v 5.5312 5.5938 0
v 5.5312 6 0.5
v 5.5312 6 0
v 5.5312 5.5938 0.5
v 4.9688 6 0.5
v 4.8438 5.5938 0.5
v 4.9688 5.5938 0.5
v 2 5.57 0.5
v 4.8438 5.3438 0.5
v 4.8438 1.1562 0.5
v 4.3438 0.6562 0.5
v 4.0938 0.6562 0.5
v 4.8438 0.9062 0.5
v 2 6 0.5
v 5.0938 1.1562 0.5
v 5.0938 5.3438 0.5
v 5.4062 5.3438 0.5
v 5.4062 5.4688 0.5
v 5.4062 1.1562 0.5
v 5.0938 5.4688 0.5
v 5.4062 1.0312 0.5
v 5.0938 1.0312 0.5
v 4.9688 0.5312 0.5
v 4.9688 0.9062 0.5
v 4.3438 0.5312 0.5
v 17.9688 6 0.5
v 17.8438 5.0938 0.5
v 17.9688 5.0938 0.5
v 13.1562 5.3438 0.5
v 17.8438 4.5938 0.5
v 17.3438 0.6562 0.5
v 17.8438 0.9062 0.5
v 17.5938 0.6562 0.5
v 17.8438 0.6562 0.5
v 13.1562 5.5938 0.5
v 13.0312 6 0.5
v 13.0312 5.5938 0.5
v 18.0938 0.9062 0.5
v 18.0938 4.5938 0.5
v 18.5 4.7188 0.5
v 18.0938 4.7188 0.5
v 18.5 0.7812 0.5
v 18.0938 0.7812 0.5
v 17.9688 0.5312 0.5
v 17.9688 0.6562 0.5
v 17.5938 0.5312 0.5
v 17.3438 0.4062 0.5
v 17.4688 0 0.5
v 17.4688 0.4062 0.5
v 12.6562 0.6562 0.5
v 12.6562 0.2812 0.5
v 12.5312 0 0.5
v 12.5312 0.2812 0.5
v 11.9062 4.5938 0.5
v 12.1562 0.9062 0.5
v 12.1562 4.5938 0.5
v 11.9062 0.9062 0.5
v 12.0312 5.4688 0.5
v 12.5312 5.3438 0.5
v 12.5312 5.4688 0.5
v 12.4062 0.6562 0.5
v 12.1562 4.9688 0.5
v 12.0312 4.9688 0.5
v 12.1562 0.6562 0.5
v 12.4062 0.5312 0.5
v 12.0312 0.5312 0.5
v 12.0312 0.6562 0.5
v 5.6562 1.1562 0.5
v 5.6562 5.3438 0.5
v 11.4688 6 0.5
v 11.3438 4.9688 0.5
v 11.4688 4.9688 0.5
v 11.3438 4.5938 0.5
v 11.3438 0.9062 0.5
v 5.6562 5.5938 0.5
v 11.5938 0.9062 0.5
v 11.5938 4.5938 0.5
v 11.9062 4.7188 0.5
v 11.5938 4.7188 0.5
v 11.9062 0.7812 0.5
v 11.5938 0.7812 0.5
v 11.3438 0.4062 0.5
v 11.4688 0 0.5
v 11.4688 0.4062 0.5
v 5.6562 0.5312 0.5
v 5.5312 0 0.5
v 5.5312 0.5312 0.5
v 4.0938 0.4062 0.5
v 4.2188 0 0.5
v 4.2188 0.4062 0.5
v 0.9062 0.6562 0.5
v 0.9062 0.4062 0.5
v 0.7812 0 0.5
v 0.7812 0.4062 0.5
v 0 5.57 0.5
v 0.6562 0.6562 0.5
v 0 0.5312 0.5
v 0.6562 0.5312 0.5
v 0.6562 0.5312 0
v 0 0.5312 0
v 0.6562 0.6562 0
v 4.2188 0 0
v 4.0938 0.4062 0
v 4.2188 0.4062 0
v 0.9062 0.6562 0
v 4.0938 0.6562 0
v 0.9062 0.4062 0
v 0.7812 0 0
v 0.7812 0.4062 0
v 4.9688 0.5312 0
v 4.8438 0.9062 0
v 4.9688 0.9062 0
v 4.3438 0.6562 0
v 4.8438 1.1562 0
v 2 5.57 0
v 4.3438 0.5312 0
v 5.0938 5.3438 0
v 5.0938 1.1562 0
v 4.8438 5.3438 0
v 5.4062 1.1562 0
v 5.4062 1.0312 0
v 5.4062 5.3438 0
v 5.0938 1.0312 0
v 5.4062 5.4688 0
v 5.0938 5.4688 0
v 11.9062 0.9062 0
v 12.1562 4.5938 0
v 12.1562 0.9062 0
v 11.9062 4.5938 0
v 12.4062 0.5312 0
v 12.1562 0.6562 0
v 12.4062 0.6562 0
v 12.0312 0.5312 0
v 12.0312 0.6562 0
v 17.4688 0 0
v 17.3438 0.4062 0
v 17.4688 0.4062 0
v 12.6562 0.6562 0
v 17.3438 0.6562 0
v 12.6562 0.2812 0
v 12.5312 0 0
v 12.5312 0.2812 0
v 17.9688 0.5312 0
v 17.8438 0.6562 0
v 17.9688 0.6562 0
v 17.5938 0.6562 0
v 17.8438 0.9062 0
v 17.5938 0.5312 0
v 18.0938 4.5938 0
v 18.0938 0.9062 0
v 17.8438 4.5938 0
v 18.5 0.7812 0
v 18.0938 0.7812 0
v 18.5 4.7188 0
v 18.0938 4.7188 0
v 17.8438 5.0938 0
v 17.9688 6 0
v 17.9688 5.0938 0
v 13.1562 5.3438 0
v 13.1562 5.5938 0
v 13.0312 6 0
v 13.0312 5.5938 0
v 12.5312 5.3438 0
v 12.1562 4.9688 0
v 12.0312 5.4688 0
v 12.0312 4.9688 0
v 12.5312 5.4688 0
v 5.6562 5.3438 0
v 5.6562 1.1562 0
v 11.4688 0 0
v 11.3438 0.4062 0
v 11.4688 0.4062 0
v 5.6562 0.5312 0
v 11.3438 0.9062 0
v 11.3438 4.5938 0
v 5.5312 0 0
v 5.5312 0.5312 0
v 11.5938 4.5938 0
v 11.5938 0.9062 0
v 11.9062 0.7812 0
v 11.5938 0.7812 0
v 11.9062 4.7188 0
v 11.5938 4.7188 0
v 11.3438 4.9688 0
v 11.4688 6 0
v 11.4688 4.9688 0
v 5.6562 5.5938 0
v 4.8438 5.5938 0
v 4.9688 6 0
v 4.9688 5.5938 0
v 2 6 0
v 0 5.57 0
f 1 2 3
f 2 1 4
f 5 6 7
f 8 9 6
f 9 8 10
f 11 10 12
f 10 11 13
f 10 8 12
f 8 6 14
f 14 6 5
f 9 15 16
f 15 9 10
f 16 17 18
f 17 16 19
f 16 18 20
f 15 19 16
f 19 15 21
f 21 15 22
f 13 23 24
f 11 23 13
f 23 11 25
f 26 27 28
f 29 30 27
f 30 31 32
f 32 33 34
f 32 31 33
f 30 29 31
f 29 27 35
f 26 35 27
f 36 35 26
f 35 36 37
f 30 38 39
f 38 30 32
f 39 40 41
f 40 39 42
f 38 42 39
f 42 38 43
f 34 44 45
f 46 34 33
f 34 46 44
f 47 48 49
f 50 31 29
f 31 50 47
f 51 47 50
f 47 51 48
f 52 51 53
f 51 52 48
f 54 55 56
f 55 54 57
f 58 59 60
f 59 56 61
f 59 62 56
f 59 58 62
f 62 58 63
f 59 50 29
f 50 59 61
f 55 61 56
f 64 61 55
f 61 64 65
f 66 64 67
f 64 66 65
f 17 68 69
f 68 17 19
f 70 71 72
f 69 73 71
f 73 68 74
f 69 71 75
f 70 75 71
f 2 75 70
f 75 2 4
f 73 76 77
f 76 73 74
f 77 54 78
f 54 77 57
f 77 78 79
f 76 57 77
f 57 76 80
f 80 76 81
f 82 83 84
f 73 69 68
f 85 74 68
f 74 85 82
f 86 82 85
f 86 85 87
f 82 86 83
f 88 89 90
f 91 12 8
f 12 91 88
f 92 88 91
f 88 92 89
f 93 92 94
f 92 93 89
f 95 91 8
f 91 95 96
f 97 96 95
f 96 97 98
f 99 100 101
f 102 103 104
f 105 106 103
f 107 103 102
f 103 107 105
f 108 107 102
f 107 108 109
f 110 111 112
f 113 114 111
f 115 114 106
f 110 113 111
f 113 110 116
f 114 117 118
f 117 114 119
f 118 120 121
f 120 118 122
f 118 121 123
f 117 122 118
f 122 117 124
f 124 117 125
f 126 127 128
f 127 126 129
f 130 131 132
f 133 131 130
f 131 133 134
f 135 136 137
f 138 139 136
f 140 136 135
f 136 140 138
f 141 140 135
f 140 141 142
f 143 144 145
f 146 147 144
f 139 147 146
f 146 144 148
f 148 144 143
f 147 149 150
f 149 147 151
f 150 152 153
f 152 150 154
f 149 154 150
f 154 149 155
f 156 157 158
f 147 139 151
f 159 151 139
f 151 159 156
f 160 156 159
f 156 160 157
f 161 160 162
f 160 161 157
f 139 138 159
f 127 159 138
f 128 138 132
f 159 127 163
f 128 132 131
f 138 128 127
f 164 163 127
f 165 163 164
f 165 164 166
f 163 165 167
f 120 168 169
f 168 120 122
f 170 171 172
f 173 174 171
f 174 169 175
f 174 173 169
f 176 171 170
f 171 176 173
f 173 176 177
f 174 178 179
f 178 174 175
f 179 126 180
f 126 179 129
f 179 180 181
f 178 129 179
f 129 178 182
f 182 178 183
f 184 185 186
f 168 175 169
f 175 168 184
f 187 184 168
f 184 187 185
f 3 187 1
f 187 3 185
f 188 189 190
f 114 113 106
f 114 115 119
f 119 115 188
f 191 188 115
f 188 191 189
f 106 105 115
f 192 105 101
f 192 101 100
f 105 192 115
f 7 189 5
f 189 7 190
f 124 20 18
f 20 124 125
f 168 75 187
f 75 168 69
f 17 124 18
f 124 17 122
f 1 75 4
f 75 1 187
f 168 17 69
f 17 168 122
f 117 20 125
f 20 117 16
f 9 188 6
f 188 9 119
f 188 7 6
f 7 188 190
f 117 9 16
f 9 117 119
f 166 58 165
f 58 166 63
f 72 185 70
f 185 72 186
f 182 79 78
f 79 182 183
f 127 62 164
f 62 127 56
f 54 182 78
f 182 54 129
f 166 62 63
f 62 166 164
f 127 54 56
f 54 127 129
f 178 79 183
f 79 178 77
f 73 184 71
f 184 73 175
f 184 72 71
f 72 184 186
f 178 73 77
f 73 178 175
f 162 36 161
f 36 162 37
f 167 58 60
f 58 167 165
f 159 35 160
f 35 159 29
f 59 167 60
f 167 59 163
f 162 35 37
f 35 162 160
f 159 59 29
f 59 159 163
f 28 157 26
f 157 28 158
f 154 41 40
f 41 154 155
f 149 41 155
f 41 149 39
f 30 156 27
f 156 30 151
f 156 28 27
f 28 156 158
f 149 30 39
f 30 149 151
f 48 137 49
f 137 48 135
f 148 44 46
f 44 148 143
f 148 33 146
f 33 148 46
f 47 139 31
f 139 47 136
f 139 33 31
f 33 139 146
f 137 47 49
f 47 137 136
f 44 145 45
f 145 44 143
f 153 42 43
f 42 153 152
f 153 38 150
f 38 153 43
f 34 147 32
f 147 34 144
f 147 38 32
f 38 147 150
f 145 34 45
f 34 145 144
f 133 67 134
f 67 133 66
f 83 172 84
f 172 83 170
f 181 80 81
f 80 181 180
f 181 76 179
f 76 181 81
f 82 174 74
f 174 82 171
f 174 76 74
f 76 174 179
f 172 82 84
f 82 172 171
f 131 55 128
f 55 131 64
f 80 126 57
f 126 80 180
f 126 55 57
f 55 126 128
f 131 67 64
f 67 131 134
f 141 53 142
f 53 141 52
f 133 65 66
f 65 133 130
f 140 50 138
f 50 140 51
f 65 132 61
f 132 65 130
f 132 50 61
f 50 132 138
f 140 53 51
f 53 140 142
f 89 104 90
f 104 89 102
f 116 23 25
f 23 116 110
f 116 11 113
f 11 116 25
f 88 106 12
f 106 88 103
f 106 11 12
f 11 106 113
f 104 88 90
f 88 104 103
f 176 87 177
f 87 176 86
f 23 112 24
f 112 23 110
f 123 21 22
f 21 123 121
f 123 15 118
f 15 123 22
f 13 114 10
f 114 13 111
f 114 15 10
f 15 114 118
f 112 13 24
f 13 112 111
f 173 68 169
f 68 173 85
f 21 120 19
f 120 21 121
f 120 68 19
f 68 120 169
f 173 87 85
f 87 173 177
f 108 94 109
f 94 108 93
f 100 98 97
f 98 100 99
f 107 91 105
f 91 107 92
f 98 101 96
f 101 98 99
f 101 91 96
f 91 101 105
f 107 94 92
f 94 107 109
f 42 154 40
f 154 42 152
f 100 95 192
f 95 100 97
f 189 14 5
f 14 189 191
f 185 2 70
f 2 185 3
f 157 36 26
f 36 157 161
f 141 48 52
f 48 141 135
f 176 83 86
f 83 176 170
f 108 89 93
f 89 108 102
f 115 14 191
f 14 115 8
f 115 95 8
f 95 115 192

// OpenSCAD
// file: modus.scad
//Corner Joint - allows the sides of two parts to create inlayed corner. Aids with welding.
//need to verify module math is the same throughout all parts.

module cornerjoint(Z,L,H,EndGap,PadL,PadH,CJangle,CJcenter){
    //change so that H = Z of inlayed part (usually 0.5)
    //add center and angle in degrees option, orgin far side of cut out area

     if((CJangle==0)&&(CJcenter==0))
      {    
        translate([0,0,0])
        rotate([0,0,CJangle])
        difference(){
        cube([L,H+PadH,Z]);
        translate([EndGap,H,0])
        cube([PadL,PadH,Z]);
        translate([L-EndGap-PadL,H,0])
        cube([PadL,PadH,Z]);}
      }    
else if((CJangle==90)&&(CJcenter==0))
      {    
        translate([H+PadH,0,0])
        rotate([0,0,CJangle])
        difference(){
        cube([L,H+PadH,Z]);
        translate([EndGap,H,0])
        cube([PadL,PadH,Z]);
        translate([L-EndGap-PadL,H,0])
        cube([PadL,PadH,Z]);}
      }
else if((CJangle==180)&&(CJcenter==0))       
      {    
        translate([L,H+PadH,0])
        rotate([0,0,CJangle])
        difference(){
        cube([L,H+PadH,Z]);
        translate([EndGap,H,0])
        cube([PadL,PadH,Z]);
        translate([L-EndGap-PadL,H,0])
        cube([PadL,PadH,Z]);}
      }
else if((CJangle==270)&&(CJcenter==0))
      {    
        translate([0,L,0])
        rotate([0,0,CJangle])
        difference(){
        cube([L,H+PadH,Z]);
        translate([EndGap,H,0])
        cube([PadL,PadH,Z]);
        translate([L-EndGap-PadL,H,0])
        cube([PadL,PadH,Z]);}
      }  
      
//centered     
   
else if((CJangle==0)&&(CJcenter==1))
      {    
        translate([-L/2,0,0])
        rotate([0,0,CJangle])
        difference(){
        cube([L,H+PadH,Z]);
        translate([EndGap,H,0])
        cube([PadL,PadH,Z]);
        translate([L-EndGap-PadL,H,0])
        cube([PadL,PadH,Z]);}
      }  
else if((CJangle==90)&&(CJcenter==1))
      {    
        translate([0,-L/2,0])
        rotate([0,0,CJangle])
        difference(){
        cube([L,H+PadH,Z]);
        translate([EndGap,H,0])
        cube([PadL,PadH,Z]);
        translate([L-EndGap-PadL,H,0])
        cube([PadL,PadH,Z]);}
      }
else if((CJangle==180)&&(CJcenter==1))       
      {    
        translate([L/2,0,0])
        rotate([0,0,CJangle])
        difference(){
        cube([L,H+PadH,Z]);
        translate([EndGap,H,0])
        cube([PadL,PadH,Z]);
        translate([L-EndGap-PadL,H,0])
        cube([PadL,PadH,Z]);}
      }
else if((CJangle==270)&&(CJcenter==1))
      {    
        translate([0,L/2,0])
        rotate([0,0,CJangle])
        difference(){
        cube([L,H+PadH,Z]);
        translate([EndGap,H,0])
        cube([PadL,PadH,Z]);
        translate([L-EndGap-PadL,H,0])
        cube([PadL,PadH,Z]);}
      }
} //end cornerjoint module

//Tab Insert - used to cut a hole for an abutting part to insert into. Typically aids with welding the two parts.
module tabinsert(X,Y,Z,dGap,cGap,c1,c2,c3,c4,c5,c6,c7,c8,center){
    translate([-dGap-(center*(X/2)),-dGap-(center*(Y/2)),0]){
        //main cut
        cube([X+(dGap*2),Y+(dGap*2),Z]);
        //corner c1c2
        translate([-cGap,(Y+(dGap*2))-c1+cGap,0])
            {
        cube([c2,c1,Z]);}
       //corner c3c4
       translate([(X+(dGap*2))-c3+cGap,(Y+(dGap*2))-c4+cGap,0]){
           cube([c3,c4,Z]);
       }
       //corner c5c6
       translate([(X+(dGap*2))-c6+cGap,-cGap,0])
      {
          cube([c6,c5,Z]);
      }
       
       //corner c7c8 
       translate([-cGap,-cGap,0]){
           cube([c7,c8,Z]);
       }
    
    } //end center translate
} //end tabinsert module
 
// file: vars.scad
brickW=6; 
brickL=12;
brickCH=6;

$fn=8; //defines resolution of circles. 8 is okay for review. 100  or greater should be used for for final dxf export.

dZstandard=0.5; //thickness of steel to be cut for drawer parts
fZstandard=0.5;
aZstandard=0.5; //thickness of steel to be cut for arm parts

fBOLTHOLEstandardD=1; //standard bolts used on frame
sliderodholeOD=1.2; 

dGap=0.03125; //gap between a hole cut's edge and the part sitting within the hole. //D3 appears to use 0.3125, is this in error?

//all parts set to standard thickness below
//off standard preferences can be defined below

//drawer
drawergap=0.0283;  //extra room for drawer to slide in the space between f1 and f4
drawerHgap=0.1884;  //total extra space from drawer sides to frame walls. sum of both sides.

d1z=dZstandard;
d2z=dZstandard;
d3z=dZstandard;
d4z=dZstandard;
d5z=dZstandard;
d6z=dZstandard;
d5z=dZstandard;
d7z=dZstandard;
d8z=dZstandard;
d9z=dZstandard;

//frame
f1x=24.2;
f1y=6;
f1z=0.5;


f2y=3.5;
f2z=fZstandard;

f3x=f1x;
f3y=3.5;
f3z=fZstandard;

f4y=11;
f4z=fZstandard;

f5y=3.5;
f5z=fZstandard;

f6y=8;
f6z=fZstandard;

f8y=brickW;
f8z=fZstandard;
f8boltD=1;

f9y=4.5;
f9x=43.5;  //set based on MAINcylinder
f9z=fZstandard;

f8x=f9x;

f11x=1.25;
f11z=fZstandard;

f13z=fZstandard;

//arms

a1x=4;
a1y=72; //calculate based on drawer cylinder
a1z=aZstandard;

a2x=6;
a2y=72;  //calculate based on drawer cylinder
a2z=aZstandard;

a4z=aZstandard;
a6z=aZstandard;

//
//Input your main cylinder's dimenions here
//
cylinderMAINminC2E=0; //main hydraulic cylinder's distance from center of mounting hole to the end of the shaft when fully compressed.
cylinderMAINmaxC2E=0; //main hydraulic cylinder's distance from center of mounting hole to the end of the shaft when fully extended.

//
//Input your drawer cylinder's dimenions here
//
cylinderDRAWERbodyH=3; //measured when in position, largest length from top to bottom of cylinder
cylinderDRAWERminC2C=0; //drawer's hydraulic cylinder's distance from the center of one mounting hole to the center of the other when fully compressed.
cylinderDRAWERmaxC2C=0; ///drawer's hydraulic cylinder's distance from the center of one mounting hole to the center of the other when fully extended.
cylinderDRAWERrodclevisW=2.5; //width of cylinders' clevis on end of rod
cylinderDRAWERrodclevisID=1;
cylinderDRAWERrodclevisOD=2;
cylinderDRAWERrearclevisW=2.5; //width of mounting clevis cylinder body
cylinderDRAWERrearclevisID=1;
cylinderDRAWERrearclevisOD=2;
cylinderDRAWERrearclevisClearance=3; //usable space around rear clevis pin (in diameter). be aware of hyraulic fittings.

//the following variables are calculated in order of dependence on preceding variables
d3x=brickL+(d2z*2);
d3y=brickCH-d1z;
d4x=brickW+d3z+d3z;
d4y=brickCH-d1z;
d5x=brickL+(d2z*2);
d5y=brickW;
d6x=brickL+(d2z*2);
d6y=brickCH;
d7x=cylinderDRAWERrearclevisClearance;
d7y=a4z+d8z+cylinderDRAWERbodyH;
d9x=cylinderDRAWERbodyH+d6z;
d9y=cylinderDRAWERbodyH+d8z;
d8x=brickL+(d2z*2);
d8y=max(5,(d9x-d6z));   //need to review fundamentals, 5 minimun unless d9 gets larger than d8
d1x=18.5;   //need to come up with a formula
d1y=18;     //need to come up with a formula
d2x=d8y+d6z+brickW+d3z+d5y+d3z;
d2y=brickCH;

f11y=f8y;
f6x=brickL+(d2z*2)+(f9y*2)+drawerHgap;
f8x=43.5;  //need to define based on MAINcylinder inputs


f2x=brickL+(d2z*2)+drawerHgap+(f9y*2)-(1.4*2);  //distance between large cut outs in f9

f5x=brickL+(d2z*2)+drawerHgap+(f9y*2)+(a1x*2); //distance between outer edges of each A1

f4x=f5x-0.5;   //same as f5 but minus 0.25 on each side to give a little overhang
// main file
include <vars.scad>;
use <modus.scad>;

echo(d8y+d6z+brickW+d3z+d5y+d3z); //total length of part

d2p();

module d2p(){
    
difference(){
cube([d2x,d2y,d2z]);
    
    //cuts numbered clockwise from top left
    
    //1 - Not on FreeCad Model??
    
    translate([0,d2y-0.43,0])
    cube([2,0.43,d2z]);
    
    //2 - D6
    
    translate([d8y,d2y-0.5,0])
    tabinsert(d6z,0.5,d2z,dGap,0.125,0,0,0,0,0.25,0.25,0.25,0.25,0);
    
    //3 - D3, D1
    
    translate([d8y+d6z+brickW,d2y-d1z-0.75,0])
    tabinsert(d3z,d1z+0.75,d2z,dGap,0.125,0,0,0,0,0.375,0.25,0.25,0.375,0);
    translate([d8y+d6z+brickW+d3z,d2y-d1z,0]) 
    tabinsert(1.5-d3z,d1z,d2z,dGap,0.125,0,0,0,0,0.25,0.625,0,0,0);
    
    //4 - D3, D1
    
    translate([d2x-d3z,d2y-0.75-d1z,0]) //put in far corner
    tabinsert(d3z,d1z+0.75,d2z,dGap,0.125,0,0,0,0,0,0,0.25,0.5,0);
    
    //5 - D3, D5
    
    translate([d8y+d6z+brickW+d3z+(d5y-0.5),0,0])
    tabinsert(0.5,d5z,d2z,dGap,0.125,0.25,0.25,0,0,0,0,0,0,0);
    translate([d8y+d6z+brickW+d3z+d5y,0,0])
    tabinsert(d3z,0.75,d2z,dGap,0.125,0.25,0.25,0,0,0,0,0,0,0);
    
    //6 -  D3, D5
    
    translate([d8y+d6z+brickW,0,0])
    tabinsert(d3z,0.75,d2z,dGap,0.125,0.5,0.25,0.25,0.25,0,0,0,0,0);
    translate([d8y+d6z+brickW+d3z,0,0]) 
    tabinsert(0.5,d5z,d2z,dGap,0.125,0,0,0.25,0.375,0,0,0,0,0);

    //7 - D6, D8 
    
    translate([d8y-0.75,0,0])
    tabinsert(0.75,d8z,d2z,dGap,0.125,0.25,0.25,0,0,0,0,0,0,0);
    translate([d8y,0,0])
    tabinsert(d6z,1,d2z,dGap,0.125,0.25,0.25,0.25,0.625,0,0,0,0,0);
    
    //8 - D8
    
    tabinsert(0.75,d8z,d2z,dGap,0.125,0,0,0.25,0.25,0,0,0,0,0);  
    
} //end difference

} //end d2p module
